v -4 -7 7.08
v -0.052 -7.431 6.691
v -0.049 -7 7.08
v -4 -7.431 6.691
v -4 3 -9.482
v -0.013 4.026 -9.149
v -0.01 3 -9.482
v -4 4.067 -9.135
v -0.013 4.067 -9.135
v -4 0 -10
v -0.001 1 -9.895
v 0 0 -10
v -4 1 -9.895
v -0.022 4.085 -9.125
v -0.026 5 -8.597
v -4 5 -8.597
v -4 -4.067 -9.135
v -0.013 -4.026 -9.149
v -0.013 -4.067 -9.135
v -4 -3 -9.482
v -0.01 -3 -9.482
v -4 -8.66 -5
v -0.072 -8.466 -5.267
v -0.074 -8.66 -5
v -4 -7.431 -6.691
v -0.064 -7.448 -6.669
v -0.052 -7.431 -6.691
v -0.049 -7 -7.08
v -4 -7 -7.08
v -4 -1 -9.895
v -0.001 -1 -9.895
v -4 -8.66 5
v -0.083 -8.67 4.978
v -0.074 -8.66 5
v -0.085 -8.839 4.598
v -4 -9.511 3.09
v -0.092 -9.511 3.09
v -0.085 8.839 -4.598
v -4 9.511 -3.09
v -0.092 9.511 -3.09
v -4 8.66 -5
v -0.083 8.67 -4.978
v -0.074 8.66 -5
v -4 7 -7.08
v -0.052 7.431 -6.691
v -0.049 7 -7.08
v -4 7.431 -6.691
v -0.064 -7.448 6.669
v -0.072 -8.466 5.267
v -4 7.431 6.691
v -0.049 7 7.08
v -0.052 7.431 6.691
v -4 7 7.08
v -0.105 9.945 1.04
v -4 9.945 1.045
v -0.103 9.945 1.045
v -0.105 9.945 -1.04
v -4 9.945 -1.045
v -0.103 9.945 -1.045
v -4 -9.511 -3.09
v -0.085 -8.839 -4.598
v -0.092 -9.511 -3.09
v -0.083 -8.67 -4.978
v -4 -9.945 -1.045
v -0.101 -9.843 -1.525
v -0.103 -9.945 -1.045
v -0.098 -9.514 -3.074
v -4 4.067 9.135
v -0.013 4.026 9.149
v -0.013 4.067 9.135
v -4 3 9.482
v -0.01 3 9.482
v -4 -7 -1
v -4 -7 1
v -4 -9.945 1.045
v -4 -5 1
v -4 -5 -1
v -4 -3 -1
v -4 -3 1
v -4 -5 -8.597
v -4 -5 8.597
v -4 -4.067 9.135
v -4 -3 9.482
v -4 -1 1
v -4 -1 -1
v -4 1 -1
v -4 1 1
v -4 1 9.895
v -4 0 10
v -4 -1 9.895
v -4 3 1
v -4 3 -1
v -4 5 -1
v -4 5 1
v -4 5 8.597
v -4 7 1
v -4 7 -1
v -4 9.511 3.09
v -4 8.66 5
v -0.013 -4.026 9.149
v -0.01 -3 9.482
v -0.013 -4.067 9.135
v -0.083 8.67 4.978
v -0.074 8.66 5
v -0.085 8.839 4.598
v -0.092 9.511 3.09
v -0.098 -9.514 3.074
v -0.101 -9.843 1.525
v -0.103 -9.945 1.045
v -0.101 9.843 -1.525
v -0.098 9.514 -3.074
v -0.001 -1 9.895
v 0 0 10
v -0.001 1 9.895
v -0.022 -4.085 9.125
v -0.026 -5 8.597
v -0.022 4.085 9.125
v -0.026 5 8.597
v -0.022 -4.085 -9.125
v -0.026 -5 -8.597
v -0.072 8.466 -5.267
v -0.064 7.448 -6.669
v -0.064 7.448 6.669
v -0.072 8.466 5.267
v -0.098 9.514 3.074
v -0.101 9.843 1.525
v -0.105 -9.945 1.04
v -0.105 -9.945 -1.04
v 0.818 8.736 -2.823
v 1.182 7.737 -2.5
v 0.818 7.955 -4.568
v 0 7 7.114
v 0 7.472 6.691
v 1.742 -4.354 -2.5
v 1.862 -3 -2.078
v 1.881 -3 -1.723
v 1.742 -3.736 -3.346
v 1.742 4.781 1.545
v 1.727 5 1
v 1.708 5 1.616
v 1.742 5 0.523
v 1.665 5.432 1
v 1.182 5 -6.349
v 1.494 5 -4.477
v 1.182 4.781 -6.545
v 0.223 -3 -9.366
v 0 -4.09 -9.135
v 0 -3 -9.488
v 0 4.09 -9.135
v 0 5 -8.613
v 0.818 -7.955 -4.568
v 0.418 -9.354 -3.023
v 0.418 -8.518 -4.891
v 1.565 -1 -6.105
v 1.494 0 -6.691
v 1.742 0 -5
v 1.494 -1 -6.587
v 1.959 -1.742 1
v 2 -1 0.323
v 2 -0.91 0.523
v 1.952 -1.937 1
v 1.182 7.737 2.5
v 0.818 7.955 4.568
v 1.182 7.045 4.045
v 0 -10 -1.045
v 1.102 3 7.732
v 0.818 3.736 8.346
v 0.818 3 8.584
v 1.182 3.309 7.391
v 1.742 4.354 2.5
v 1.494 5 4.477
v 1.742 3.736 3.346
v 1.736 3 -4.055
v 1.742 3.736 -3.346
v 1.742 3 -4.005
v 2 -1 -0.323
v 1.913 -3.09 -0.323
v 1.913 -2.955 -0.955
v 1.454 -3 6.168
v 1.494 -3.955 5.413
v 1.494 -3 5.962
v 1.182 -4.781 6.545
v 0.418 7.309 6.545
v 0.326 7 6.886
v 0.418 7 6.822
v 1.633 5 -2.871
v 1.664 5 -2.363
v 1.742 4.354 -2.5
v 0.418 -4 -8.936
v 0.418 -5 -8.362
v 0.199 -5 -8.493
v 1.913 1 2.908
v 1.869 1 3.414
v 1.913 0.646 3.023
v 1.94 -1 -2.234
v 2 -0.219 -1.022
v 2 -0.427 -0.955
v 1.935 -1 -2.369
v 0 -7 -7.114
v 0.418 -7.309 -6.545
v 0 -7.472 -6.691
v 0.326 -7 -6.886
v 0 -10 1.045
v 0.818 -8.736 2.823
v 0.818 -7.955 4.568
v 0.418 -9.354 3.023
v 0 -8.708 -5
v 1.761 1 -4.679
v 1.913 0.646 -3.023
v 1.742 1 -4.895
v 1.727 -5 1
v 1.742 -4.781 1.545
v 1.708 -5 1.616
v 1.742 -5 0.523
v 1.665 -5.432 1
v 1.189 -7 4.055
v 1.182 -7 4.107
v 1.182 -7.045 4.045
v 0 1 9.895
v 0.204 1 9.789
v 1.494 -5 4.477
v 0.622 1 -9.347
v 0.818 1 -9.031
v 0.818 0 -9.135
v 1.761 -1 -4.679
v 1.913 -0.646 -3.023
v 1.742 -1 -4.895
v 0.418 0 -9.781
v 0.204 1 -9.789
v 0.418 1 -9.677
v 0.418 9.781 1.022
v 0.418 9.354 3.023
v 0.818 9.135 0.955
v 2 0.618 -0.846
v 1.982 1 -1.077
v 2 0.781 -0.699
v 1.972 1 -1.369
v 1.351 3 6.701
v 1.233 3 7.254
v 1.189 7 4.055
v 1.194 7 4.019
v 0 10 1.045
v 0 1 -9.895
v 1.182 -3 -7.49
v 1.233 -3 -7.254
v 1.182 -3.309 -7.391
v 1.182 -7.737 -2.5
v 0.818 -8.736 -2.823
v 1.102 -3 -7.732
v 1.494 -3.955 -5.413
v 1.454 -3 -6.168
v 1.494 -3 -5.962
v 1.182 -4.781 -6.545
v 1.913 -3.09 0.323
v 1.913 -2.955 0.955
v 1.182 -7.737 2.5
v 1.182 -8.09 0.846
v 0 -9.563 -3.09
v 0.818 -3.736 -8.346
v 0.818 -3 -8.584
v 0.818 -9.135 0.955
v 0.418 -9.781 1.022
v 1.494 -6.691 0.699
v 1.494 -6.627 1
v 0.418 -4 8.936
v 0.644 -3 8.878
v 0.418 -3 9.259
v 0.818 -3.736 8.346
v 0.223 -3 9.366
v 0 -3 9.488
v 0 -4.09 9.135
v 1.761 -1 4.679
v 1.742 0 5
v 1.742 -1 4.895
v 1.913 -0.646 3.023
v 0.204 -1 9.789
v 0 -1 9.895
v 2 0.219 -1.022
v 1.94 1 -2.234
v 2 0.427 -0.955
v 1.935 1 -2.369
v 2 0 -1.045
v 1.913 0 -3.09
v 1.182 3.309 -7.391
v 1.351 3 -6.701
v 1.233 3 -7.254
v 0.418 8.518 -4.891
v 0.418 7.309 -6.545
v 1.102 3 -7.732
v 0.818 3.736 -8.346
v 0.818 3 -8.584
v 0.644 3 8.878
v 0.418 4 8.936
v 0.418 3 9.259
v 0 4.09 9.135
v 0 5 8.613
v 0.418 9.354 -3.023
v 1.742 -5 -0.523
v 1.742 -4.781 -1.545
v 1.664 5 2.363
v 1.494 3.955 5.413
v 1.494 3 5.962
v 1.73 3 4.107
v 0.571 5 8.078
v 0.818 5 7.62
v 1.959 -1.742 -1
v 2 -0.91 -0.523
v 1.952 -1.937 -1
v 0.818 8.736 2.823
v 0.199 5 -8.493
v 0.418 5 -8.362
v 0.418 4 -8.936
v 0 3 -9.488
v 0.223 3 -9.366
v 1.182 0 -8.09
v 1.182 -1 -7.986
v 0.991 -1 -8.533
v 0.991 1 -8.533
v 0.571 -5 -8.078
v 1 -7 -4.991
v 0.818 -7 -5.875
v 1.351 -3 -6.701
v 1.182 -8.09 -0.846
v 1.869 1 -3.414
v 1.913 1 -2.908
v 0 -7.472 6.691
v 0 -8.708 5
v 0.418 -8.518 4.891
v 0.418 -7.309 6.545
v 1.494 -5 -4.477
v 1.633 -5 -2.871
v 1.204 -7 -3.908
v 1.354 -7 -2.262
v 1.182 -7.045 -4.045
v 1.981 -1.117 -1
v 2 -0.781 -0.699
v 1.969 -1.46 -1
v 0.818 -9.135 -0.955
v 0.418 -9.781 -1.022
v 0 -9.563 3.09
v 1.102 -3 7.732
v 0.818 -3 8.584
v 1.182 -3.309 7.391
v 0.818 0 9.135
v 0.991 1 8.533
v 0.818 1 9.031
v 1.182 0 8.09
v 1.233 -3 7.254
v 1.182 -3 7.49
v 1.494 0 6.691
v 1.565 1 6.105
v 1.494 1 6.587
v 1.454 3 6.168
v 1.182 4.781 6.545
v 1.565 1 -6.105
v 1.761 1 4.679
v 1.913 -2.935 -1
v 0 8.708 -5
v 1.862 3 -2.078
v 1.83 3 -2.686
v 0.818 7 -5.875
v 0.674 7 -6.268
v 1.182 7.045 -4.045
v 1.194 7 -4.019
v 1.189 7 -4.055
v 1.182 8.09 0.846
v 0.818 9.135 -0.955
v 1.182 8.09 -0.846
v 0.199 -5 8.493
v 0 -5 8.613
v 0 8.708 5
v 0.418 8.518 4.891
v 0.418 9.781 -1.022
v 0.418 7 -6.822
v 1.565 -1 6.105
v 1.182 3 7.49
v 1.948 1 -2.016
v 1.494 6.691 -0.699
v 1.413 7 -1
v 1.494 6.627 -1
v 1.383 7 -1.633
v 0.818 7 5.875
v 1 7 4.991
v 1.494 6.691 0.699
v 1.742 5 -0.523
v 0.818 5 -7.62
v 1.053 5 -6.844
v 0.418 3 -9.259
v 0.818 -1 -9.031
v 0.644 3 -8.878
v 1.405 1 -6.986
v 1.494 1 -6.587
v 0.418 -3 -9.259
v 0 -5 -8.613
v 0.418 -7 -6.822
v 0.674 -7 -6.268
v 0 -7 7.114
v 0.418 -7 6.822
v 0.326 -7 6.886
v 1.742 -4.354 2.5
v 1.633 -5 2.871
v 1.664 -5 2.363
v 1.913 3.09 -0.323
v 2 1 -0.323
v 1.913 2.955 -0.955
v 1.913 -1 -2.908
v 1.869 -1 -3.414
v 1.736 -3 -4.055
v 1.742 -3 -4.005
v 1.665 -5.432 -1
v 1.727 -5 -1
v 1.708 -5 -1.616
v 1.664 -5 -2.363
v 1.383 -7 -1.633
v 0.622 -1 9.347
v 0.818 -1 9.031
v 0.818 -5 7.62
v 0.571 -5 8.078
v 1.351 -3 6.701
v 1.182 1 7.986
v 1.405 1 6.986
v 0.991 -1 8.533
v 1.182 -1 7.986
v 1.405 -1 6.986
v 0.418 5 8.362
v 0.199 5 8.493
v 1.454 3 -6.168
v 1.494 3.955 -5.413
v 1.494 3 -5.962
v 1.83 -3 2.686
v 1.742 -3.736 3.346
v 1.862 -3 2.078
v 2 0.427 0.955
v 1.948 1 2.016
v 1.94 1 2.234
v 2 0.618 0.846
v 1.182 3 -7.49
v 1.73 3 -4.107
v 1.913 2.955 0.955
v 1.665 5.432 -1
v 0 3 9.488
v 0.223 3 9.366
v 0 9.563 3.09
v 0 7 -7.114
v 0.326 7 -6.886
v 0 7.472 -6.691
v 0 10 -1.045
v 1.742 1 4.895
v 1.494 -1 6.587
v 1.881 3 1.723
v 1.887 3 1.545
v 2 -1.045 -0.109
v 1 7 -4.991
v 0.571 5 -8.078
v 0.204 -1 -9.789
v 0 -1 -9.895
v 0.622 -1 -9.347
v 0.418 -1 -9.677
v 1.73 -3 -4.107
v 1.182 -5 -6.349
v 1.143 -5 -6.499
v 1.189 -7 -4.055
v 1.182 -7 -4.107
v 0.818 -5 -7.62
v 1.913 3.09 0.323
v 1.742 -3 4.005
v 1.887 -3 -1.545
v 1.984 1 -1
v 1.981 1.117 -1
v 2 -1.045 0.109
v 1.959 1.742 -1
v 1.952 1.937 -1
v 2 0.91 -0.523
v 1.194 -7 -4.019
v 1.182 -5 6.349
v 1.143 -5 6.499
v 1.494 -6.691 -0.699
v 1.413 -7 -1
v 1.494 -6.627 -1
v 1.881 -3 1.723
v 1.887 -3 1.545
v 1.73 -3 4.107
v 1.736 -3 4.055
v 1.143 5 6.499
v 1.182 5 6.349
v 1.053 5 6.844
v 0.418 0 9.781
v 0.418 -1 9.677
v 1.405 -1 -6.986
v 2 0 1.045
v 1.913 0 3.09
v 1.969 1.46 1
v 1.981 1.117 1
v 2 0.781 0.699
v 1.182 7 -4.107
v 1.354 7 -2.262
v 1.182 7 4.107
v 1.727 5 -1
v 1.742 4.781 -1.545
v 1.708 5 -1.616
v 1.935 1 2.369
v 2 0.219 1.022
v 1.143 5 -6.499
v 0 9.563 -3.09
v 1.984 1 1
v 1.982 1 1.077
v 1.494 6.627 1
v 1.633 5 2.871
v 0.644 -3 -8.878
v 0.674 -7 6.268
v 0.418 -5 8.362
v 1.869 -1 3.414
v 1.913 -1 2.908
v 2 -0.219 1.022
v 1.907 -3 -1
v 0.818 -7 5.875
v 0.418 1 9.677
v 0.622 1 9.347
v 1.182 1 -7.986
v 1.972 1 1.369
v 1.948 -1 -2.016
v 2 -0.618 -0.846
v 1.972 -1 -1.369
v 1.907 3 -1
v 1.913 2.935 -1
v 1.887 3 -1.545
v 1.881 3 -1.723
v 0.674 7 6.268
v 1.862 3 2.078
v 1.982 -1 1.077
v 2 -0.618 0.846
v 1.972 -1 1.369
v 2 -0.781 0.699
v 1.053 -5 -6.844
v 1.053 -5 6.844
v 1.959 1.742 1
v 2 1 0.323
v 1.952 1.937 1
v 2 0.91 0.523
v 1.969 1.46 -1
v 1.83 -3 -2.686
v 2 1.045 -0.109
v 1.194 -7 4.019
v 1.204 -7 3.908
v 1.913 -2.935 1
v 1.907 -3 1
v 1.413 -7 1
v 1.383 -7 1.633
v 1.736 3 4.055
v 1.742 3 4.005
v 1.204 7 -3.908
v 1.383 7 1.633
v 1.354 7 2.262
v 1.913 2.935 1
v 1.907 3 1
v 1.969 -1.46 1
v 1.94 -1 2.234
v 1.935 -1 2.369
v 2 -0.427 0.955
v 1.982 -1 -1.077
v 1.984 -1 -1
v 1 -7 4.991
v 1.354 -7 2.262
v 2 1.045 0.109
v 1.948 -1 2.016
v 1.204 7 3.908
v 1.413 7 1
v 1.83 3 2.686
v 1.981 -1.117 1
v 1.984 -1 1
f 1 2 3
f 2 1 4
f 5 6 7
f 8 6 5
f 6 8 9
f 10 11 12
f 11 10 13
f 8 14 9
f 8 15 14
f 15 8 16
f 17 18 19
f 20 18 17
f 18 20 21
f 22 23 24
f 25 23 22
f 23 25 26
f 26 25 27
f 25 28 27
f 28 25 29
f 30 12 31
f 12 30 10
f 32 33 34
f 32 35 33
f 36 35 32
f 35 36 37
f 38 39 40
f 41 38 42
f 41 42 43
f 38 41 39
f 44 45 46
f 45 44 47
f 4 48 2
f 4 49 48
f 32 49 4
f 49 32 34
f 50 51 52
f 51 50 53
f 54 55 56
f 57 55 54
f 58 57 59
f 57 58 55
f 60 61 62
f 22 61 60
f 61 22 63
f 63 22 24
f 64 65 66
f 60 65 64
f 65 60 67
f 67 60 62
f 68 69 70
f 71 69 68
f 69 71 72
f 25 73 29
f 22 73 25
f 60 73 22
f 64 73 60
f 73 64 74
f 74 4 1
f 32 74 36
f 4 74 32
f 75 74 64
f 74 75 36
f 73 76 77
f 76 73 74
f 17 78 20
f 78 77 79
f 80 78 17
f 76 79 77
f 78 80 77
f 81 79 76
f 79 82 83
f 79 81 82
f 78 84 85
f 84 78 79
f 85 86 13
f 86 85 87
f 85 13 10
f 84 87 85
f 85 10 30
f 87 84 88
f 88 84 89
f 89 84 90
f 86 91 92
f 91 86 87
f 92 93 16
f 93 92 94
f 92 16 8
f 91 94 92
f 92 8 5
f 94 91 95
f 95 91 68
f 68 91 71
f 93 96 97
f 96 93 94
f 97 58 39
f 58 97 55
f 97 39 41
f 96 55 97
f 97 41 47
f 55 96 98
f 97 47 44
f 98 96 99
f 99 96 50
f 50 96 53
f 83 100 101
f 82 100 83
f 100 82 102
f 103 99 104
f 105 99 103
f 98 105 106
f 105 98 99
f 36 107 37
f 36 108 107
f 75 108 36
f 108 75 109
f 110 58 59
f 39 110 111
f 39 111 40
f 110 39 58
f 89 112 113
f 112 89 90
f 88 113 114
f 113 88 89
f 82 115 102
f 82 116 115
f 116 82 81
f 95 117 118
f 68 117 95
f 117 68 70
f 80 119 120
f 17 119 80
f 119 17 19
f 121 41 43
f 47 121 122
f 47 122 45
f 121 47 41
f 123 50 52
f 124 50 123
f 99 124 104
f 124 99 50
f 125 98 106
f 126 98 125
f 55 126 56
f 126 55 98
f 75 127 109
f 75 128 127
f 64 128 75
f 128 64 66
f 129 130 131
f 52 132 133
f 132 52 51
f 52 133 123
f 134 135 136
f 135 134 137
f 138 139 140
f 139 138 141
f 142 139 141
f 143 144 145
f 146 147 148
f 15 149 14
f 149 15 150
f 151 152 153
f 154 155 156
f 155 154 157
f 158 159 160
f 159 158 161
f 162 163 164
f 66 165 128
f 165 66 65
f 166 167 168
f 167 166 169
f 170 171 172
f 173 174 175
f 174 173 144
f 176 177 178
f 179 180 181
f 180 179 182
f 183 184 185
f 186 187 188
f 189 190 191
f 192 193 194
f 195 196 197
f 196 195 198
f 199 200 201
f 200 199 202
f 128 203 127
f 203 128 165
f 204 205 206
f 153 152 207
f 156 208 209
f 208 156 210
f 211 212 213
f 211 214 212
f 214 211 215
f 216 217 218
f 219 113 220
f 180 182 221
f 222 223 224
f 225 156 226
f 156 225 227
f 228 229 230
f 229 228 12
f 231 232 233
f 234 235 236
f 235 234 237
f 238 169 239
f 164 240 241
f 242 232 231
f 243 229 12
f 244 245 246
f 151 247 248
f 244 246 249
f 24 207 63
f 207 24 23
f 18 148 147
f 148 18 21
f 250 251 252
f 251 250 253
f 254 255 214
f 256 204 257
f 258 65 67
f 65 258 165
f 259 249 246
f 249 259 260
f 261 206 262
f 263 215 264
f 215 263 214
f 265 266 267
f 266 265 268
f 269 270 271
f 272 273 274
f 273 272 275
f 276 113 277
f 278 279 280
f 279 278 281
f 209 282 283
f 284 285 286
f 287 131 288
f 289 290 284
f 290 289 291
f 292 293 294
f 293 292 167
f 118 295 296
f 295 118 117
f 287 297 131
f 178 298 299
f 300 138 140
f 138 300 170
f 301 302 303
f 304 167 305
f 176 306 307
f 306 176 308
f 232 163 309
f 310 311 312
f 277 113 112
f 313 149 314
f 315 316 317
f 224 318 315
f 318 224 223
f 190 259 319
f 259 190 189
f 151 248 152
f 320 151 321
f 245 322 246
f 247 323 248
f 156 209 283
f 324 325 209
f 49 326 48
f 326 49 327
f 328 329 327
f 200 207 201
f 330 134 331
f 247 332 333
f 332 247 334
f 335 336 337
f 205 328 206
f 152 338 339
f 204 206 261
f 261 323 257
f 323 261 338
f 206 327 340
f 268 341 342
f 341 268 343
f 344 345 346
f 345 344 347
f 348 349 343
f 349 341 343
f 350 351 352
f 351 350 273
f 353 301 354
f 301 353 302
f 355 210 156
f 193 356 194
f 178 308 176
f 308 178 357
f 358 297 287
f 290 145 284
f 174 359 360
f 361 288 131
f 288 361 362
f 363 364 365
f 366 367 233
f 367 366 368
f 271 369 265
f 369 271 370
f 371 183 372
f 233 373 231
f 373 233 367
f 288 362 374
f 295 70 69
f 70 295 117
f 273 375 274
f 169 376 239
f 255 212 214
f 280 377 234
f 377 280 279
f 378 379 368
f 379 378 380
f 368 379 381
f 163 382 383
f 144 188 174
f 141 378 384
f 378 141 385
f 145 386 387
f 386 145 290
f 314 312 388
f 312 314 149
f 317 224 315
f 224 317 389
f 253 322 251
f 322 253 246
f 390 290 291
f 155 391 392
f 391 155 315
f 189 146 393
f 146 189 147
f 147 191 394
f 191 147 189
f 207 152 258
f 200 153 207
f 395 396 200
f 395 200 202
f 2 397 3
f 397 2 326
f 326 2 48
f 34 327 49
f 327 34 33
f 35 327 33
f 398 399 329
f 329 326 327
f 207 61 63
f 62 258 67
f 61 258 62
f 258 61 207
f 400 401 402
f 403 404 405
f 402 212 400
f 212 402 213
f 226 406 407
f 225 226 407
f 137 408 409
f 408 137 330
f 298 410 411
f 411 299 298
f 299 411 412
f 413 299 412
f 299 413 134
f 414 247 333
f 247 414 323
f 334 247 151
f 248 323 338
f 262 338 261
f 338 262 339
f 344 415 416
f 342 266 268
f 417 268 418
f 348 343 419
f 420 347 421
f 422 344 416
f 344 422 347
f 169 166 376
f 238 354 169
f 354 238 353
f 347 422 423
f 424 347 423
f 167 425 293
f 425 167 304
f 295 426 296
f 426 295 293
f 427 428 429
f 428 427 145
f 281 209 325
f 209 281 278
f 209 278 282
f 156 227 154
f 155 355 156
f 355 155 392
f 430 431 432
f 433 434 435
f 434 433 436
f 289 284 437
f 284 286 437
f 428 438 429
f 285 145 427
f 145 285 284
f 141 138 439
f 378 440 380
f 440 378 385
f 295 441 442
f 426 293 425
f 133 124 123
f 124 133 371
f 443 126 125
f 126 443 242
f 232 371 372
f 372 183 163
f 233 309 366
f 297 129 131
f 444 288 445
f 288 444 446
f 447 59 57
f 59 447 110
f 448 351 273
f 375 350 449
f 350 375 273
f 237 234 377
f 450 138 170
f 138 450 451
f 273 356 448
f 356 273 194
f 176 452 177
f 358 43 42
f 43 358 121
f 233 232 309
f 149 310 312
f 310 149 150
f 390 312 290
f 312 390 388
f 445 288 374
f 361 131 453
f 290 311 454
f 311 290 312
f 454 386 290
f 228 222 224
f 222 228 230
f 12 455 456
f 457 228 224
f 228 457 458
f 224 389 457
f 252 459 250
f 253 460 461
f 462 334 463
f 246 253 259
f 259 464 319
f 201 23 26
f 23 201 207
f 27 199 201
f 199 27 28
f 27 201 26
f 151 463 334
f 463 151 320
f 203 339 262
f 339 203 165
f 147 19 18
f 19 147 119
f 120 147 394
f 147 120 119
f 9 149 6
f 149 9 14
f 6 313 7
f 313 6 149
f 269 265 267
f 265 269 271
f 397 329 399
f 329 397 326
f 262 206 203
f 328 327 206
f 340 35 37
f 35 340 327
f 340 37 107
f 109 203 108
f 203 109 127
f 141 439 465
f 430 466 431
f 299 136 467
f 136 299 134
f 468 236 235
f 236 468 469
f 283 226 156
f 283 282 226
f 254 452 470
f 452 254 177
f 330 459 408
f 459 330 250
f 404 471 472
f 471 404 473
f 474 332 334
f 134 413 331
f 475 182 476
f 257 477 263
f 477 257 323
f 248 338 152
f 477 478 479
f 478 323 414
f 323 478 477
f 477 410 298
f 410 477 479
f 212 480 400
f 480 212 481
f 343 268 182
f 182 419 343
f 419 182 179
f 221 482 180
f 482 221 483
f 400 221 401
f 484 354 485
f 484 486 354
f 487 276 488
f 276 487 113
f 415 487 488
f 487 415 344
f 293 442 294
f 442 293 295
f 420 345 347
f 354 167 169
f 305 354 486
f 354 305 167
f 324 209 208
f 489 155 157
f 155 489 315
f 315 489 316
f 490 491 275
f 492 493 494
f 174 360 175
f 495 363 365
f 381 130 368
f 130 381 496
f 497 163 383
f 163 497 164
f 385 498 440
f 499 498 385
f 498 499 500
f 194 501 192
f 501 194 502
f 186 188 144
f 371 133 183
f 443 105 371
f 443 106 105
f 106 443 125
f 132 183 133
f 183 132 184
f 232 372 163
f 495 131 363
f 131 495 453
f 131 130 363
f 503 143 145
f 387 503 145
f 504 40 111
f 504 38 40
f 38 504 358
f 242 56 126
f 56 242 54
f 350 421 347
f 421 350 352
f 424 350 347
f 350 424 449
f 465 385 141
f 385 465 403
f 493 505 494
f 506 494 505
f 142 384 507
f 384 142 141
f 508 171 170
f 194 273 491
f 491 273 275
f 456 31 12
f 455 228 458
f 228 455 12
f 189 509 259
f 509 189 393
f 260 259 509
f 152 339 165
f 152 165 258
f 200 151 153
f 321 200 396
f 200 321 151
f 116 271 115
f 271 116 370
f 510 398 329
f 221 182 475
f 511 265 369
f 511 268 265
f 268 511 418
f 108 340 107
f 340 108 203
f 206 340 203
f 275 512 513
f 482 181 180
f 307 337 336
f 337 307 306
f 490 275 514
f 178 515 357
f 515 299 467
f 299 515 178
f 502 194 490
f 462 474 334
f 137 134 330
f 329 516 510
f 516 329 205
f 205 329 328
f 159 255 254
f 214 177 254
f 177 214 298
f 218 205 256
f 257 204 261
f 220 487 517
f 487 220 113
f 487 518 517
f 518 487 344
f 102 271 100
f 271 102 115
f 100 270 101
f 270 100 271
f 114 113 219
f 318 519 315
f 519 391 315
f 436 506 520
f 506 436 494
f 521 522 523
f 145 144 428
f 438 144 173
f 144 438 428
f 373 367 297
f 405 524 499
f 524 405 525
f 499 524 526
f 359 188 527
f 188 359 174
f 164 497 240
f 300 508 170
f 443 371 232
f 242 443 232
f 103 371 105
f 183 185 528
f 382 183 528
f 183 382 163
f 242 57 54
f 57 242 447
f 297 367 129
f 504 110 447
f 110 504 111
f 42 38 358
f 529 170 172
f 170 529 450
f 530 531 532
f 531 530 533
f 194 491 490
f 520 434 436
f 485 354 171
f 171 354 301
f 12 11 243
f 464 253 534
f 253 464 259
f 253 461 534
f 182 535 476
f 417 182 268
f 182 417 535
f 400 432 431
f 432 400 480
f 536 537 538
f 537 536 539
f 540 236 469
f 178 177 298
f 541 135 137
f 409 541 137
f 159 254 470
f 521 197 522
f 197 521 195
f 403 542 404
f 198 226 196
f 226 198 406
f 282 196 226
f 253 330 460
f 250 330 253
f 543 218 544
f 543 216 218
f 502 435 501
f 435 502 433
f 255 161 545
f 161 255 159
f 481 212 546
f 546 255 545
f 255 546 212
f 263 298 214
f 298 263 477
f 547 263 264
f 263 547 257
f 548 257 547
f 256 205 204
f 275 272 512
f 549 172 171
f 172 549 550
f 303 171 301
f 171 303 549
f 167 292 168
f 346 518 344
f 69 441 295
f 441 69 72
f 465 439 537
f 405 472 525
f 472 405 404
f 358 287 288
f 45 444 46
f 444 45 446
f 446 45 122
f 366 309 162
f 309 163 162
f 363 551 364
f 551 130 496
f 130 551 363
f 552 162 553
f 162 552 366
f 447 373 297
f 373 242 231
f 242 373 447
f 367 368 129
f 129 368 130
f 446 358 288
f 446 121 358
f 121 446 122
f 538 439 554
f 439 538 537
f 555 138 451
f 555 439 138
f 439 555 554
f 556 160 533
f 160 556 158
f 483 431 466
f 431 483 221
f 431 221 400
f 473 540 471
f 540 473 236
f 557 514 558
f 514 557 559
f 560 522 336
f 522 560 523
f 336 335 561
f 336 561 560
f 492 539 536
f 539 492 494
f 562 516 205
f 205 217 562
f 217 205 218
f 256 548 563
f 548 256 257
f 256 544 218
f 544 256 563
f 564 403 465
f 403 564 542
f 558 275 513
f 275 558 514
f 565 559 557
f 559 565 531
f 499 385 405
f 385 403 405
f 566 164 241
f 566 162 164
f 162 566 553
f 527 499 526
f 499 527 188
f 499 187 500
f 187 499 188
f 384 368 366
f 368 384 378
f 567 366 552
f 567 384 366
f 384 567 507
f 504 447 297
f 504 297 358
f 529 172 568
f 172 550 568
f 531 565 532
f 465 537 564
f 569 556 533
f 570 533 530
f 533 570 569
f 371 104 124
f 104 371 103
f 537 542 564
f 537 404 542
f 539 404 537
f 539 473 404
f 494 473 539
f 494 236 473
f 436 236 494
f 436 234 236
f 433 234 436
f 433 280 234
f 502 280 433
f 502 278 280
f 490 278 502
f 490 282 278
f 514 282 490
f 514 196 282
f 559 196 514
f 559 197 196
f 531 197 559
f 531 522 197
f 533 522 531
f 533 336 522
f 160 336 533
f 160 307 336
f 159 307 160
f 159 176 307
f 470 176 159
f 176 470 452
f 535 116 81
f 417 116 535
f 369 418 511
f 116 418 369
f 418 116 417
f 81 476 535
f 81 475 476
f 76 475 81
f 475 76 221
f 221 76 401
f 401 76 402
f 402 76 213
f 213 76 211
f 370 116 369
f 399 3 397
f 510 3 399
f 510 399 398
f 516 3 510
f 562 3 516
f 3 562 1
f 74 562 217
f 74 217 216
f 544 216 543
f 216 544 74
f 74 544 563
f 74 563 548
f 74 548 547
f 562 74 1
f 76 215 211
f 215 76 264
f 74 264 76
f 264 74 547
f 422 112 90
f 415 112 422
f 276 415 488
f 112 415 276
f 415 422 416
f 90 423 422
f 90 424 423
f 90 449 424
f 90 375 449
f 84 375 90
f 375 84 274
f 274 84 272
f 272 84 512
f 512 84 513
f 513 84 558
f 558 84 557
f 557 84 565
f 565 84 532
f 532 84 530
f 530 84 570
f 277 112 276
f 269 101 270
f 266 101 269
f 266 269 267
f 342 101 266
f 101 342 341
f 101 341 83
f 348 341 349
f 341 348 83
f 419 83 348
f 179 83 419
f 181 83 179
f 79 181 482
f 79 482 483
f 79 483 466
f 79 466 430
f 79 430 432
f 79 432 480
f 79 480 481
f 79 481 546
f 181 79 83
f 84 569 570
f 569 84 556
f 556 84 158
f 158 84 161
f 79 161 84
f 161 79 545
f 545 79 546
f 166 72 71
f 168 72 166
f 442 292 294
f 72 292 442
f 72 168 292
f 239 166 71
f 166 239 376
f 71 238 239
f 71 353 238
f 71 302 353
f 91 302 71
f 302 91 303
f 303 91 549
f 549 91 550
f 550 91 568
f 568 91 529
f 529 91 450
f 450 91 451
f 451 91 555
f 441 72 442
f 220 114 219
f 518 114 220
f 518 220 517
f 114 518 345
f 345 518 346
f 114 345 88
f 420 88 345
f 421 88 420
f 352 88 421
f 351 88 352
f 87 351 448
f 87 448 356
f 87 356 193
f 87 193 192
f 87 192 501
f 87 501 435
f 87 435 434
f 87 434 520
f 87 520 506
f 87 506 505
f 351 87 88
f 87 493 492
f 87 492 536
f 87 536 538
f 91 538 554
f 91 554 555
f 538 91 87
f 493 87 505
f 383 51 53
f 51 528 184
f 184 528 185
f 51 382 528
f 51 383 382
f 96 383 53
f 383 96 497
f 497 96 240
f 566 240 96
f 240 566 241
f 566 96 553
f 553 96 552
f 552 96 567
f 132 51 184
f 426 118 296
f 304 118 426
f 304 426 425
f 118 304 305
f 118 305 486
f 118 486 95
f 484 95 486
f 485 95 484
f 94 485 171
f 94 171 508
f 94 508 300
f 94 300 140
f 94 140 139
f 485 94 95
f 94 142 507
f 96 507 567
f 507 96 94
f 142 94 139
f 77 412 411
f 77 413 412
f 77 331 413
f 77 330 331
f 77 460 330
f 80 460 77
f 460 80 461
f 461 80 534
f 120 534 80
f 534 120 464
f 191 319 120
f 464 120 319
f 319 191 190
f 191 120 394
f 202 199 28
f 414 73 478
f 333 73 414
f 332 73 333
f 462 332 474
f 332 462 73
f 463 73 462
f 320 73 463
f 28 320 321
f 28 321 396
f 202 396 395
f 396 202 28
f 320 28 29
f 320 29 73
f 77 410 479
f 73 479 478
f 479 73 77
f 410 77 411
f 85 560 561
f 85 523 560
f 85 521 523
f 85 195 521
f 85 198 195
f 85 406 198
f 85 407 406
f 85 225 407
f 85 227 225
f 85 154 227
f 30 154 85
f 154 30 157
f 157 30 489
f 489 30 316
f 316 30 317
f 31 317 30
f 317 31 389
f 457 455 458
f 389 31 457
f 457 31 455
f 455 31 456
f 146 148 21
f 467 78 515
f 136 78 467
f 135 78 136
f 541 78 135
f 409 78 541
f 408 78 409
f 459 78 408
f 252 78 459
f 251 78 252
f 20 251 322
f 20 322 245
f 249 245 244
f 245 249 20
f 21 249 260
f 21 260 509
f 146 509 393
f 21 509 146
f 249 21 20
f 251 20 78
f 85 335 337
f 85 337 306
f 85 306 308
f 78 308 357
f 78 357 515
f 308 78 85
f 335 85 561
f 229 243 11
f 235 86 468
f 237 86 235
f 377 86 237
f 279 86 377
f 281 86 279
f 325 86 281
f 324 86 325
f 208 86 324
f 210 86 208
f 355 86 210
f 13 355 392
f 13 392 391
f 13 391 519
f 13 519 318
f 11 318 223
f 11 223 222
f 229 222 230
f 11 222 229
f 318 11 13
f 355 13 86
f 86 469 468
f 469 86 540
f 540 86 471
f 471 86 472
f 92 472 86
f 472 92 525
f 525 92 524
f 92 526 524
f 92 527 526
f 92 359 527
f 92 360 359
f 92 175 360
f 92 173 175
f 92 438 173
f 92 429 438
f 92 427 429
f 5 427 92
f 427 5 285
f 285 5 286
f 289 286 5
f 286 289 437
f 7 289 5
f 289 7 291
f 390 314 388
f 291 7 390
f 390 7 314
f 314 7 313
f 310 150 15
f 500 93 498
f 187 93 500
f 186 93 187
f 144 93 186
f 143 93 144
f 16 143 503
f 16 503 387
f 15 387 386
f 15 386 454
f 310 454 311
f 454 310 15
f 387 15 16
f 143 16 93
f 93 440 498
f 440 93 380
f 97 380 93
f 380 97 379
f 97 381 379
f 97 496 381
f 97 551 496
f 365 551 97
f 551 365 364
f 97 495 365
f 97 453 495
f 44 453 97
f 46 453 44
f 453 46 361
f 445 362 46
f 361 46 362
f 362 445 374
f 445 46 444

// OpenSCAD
Speaker();

module Speaker()
{
	rotate([0, 90, 0])
		difference()
		{
			union()
			{
				translate([0, 0, -2])
					cylinder(h=4, r=10, center=true);
				resize([20, 20, 4])
					sphere(r=10, center=true);
			}
			for (x=[-11 : 22 : 11])
			{
				for (y=[-6 : 4 : 6])
				{
					translate([x, y, 0])
					rotate([0, 0, 90])
					cube([2, 20, 20], center=true);
				}
			}
		}
}
